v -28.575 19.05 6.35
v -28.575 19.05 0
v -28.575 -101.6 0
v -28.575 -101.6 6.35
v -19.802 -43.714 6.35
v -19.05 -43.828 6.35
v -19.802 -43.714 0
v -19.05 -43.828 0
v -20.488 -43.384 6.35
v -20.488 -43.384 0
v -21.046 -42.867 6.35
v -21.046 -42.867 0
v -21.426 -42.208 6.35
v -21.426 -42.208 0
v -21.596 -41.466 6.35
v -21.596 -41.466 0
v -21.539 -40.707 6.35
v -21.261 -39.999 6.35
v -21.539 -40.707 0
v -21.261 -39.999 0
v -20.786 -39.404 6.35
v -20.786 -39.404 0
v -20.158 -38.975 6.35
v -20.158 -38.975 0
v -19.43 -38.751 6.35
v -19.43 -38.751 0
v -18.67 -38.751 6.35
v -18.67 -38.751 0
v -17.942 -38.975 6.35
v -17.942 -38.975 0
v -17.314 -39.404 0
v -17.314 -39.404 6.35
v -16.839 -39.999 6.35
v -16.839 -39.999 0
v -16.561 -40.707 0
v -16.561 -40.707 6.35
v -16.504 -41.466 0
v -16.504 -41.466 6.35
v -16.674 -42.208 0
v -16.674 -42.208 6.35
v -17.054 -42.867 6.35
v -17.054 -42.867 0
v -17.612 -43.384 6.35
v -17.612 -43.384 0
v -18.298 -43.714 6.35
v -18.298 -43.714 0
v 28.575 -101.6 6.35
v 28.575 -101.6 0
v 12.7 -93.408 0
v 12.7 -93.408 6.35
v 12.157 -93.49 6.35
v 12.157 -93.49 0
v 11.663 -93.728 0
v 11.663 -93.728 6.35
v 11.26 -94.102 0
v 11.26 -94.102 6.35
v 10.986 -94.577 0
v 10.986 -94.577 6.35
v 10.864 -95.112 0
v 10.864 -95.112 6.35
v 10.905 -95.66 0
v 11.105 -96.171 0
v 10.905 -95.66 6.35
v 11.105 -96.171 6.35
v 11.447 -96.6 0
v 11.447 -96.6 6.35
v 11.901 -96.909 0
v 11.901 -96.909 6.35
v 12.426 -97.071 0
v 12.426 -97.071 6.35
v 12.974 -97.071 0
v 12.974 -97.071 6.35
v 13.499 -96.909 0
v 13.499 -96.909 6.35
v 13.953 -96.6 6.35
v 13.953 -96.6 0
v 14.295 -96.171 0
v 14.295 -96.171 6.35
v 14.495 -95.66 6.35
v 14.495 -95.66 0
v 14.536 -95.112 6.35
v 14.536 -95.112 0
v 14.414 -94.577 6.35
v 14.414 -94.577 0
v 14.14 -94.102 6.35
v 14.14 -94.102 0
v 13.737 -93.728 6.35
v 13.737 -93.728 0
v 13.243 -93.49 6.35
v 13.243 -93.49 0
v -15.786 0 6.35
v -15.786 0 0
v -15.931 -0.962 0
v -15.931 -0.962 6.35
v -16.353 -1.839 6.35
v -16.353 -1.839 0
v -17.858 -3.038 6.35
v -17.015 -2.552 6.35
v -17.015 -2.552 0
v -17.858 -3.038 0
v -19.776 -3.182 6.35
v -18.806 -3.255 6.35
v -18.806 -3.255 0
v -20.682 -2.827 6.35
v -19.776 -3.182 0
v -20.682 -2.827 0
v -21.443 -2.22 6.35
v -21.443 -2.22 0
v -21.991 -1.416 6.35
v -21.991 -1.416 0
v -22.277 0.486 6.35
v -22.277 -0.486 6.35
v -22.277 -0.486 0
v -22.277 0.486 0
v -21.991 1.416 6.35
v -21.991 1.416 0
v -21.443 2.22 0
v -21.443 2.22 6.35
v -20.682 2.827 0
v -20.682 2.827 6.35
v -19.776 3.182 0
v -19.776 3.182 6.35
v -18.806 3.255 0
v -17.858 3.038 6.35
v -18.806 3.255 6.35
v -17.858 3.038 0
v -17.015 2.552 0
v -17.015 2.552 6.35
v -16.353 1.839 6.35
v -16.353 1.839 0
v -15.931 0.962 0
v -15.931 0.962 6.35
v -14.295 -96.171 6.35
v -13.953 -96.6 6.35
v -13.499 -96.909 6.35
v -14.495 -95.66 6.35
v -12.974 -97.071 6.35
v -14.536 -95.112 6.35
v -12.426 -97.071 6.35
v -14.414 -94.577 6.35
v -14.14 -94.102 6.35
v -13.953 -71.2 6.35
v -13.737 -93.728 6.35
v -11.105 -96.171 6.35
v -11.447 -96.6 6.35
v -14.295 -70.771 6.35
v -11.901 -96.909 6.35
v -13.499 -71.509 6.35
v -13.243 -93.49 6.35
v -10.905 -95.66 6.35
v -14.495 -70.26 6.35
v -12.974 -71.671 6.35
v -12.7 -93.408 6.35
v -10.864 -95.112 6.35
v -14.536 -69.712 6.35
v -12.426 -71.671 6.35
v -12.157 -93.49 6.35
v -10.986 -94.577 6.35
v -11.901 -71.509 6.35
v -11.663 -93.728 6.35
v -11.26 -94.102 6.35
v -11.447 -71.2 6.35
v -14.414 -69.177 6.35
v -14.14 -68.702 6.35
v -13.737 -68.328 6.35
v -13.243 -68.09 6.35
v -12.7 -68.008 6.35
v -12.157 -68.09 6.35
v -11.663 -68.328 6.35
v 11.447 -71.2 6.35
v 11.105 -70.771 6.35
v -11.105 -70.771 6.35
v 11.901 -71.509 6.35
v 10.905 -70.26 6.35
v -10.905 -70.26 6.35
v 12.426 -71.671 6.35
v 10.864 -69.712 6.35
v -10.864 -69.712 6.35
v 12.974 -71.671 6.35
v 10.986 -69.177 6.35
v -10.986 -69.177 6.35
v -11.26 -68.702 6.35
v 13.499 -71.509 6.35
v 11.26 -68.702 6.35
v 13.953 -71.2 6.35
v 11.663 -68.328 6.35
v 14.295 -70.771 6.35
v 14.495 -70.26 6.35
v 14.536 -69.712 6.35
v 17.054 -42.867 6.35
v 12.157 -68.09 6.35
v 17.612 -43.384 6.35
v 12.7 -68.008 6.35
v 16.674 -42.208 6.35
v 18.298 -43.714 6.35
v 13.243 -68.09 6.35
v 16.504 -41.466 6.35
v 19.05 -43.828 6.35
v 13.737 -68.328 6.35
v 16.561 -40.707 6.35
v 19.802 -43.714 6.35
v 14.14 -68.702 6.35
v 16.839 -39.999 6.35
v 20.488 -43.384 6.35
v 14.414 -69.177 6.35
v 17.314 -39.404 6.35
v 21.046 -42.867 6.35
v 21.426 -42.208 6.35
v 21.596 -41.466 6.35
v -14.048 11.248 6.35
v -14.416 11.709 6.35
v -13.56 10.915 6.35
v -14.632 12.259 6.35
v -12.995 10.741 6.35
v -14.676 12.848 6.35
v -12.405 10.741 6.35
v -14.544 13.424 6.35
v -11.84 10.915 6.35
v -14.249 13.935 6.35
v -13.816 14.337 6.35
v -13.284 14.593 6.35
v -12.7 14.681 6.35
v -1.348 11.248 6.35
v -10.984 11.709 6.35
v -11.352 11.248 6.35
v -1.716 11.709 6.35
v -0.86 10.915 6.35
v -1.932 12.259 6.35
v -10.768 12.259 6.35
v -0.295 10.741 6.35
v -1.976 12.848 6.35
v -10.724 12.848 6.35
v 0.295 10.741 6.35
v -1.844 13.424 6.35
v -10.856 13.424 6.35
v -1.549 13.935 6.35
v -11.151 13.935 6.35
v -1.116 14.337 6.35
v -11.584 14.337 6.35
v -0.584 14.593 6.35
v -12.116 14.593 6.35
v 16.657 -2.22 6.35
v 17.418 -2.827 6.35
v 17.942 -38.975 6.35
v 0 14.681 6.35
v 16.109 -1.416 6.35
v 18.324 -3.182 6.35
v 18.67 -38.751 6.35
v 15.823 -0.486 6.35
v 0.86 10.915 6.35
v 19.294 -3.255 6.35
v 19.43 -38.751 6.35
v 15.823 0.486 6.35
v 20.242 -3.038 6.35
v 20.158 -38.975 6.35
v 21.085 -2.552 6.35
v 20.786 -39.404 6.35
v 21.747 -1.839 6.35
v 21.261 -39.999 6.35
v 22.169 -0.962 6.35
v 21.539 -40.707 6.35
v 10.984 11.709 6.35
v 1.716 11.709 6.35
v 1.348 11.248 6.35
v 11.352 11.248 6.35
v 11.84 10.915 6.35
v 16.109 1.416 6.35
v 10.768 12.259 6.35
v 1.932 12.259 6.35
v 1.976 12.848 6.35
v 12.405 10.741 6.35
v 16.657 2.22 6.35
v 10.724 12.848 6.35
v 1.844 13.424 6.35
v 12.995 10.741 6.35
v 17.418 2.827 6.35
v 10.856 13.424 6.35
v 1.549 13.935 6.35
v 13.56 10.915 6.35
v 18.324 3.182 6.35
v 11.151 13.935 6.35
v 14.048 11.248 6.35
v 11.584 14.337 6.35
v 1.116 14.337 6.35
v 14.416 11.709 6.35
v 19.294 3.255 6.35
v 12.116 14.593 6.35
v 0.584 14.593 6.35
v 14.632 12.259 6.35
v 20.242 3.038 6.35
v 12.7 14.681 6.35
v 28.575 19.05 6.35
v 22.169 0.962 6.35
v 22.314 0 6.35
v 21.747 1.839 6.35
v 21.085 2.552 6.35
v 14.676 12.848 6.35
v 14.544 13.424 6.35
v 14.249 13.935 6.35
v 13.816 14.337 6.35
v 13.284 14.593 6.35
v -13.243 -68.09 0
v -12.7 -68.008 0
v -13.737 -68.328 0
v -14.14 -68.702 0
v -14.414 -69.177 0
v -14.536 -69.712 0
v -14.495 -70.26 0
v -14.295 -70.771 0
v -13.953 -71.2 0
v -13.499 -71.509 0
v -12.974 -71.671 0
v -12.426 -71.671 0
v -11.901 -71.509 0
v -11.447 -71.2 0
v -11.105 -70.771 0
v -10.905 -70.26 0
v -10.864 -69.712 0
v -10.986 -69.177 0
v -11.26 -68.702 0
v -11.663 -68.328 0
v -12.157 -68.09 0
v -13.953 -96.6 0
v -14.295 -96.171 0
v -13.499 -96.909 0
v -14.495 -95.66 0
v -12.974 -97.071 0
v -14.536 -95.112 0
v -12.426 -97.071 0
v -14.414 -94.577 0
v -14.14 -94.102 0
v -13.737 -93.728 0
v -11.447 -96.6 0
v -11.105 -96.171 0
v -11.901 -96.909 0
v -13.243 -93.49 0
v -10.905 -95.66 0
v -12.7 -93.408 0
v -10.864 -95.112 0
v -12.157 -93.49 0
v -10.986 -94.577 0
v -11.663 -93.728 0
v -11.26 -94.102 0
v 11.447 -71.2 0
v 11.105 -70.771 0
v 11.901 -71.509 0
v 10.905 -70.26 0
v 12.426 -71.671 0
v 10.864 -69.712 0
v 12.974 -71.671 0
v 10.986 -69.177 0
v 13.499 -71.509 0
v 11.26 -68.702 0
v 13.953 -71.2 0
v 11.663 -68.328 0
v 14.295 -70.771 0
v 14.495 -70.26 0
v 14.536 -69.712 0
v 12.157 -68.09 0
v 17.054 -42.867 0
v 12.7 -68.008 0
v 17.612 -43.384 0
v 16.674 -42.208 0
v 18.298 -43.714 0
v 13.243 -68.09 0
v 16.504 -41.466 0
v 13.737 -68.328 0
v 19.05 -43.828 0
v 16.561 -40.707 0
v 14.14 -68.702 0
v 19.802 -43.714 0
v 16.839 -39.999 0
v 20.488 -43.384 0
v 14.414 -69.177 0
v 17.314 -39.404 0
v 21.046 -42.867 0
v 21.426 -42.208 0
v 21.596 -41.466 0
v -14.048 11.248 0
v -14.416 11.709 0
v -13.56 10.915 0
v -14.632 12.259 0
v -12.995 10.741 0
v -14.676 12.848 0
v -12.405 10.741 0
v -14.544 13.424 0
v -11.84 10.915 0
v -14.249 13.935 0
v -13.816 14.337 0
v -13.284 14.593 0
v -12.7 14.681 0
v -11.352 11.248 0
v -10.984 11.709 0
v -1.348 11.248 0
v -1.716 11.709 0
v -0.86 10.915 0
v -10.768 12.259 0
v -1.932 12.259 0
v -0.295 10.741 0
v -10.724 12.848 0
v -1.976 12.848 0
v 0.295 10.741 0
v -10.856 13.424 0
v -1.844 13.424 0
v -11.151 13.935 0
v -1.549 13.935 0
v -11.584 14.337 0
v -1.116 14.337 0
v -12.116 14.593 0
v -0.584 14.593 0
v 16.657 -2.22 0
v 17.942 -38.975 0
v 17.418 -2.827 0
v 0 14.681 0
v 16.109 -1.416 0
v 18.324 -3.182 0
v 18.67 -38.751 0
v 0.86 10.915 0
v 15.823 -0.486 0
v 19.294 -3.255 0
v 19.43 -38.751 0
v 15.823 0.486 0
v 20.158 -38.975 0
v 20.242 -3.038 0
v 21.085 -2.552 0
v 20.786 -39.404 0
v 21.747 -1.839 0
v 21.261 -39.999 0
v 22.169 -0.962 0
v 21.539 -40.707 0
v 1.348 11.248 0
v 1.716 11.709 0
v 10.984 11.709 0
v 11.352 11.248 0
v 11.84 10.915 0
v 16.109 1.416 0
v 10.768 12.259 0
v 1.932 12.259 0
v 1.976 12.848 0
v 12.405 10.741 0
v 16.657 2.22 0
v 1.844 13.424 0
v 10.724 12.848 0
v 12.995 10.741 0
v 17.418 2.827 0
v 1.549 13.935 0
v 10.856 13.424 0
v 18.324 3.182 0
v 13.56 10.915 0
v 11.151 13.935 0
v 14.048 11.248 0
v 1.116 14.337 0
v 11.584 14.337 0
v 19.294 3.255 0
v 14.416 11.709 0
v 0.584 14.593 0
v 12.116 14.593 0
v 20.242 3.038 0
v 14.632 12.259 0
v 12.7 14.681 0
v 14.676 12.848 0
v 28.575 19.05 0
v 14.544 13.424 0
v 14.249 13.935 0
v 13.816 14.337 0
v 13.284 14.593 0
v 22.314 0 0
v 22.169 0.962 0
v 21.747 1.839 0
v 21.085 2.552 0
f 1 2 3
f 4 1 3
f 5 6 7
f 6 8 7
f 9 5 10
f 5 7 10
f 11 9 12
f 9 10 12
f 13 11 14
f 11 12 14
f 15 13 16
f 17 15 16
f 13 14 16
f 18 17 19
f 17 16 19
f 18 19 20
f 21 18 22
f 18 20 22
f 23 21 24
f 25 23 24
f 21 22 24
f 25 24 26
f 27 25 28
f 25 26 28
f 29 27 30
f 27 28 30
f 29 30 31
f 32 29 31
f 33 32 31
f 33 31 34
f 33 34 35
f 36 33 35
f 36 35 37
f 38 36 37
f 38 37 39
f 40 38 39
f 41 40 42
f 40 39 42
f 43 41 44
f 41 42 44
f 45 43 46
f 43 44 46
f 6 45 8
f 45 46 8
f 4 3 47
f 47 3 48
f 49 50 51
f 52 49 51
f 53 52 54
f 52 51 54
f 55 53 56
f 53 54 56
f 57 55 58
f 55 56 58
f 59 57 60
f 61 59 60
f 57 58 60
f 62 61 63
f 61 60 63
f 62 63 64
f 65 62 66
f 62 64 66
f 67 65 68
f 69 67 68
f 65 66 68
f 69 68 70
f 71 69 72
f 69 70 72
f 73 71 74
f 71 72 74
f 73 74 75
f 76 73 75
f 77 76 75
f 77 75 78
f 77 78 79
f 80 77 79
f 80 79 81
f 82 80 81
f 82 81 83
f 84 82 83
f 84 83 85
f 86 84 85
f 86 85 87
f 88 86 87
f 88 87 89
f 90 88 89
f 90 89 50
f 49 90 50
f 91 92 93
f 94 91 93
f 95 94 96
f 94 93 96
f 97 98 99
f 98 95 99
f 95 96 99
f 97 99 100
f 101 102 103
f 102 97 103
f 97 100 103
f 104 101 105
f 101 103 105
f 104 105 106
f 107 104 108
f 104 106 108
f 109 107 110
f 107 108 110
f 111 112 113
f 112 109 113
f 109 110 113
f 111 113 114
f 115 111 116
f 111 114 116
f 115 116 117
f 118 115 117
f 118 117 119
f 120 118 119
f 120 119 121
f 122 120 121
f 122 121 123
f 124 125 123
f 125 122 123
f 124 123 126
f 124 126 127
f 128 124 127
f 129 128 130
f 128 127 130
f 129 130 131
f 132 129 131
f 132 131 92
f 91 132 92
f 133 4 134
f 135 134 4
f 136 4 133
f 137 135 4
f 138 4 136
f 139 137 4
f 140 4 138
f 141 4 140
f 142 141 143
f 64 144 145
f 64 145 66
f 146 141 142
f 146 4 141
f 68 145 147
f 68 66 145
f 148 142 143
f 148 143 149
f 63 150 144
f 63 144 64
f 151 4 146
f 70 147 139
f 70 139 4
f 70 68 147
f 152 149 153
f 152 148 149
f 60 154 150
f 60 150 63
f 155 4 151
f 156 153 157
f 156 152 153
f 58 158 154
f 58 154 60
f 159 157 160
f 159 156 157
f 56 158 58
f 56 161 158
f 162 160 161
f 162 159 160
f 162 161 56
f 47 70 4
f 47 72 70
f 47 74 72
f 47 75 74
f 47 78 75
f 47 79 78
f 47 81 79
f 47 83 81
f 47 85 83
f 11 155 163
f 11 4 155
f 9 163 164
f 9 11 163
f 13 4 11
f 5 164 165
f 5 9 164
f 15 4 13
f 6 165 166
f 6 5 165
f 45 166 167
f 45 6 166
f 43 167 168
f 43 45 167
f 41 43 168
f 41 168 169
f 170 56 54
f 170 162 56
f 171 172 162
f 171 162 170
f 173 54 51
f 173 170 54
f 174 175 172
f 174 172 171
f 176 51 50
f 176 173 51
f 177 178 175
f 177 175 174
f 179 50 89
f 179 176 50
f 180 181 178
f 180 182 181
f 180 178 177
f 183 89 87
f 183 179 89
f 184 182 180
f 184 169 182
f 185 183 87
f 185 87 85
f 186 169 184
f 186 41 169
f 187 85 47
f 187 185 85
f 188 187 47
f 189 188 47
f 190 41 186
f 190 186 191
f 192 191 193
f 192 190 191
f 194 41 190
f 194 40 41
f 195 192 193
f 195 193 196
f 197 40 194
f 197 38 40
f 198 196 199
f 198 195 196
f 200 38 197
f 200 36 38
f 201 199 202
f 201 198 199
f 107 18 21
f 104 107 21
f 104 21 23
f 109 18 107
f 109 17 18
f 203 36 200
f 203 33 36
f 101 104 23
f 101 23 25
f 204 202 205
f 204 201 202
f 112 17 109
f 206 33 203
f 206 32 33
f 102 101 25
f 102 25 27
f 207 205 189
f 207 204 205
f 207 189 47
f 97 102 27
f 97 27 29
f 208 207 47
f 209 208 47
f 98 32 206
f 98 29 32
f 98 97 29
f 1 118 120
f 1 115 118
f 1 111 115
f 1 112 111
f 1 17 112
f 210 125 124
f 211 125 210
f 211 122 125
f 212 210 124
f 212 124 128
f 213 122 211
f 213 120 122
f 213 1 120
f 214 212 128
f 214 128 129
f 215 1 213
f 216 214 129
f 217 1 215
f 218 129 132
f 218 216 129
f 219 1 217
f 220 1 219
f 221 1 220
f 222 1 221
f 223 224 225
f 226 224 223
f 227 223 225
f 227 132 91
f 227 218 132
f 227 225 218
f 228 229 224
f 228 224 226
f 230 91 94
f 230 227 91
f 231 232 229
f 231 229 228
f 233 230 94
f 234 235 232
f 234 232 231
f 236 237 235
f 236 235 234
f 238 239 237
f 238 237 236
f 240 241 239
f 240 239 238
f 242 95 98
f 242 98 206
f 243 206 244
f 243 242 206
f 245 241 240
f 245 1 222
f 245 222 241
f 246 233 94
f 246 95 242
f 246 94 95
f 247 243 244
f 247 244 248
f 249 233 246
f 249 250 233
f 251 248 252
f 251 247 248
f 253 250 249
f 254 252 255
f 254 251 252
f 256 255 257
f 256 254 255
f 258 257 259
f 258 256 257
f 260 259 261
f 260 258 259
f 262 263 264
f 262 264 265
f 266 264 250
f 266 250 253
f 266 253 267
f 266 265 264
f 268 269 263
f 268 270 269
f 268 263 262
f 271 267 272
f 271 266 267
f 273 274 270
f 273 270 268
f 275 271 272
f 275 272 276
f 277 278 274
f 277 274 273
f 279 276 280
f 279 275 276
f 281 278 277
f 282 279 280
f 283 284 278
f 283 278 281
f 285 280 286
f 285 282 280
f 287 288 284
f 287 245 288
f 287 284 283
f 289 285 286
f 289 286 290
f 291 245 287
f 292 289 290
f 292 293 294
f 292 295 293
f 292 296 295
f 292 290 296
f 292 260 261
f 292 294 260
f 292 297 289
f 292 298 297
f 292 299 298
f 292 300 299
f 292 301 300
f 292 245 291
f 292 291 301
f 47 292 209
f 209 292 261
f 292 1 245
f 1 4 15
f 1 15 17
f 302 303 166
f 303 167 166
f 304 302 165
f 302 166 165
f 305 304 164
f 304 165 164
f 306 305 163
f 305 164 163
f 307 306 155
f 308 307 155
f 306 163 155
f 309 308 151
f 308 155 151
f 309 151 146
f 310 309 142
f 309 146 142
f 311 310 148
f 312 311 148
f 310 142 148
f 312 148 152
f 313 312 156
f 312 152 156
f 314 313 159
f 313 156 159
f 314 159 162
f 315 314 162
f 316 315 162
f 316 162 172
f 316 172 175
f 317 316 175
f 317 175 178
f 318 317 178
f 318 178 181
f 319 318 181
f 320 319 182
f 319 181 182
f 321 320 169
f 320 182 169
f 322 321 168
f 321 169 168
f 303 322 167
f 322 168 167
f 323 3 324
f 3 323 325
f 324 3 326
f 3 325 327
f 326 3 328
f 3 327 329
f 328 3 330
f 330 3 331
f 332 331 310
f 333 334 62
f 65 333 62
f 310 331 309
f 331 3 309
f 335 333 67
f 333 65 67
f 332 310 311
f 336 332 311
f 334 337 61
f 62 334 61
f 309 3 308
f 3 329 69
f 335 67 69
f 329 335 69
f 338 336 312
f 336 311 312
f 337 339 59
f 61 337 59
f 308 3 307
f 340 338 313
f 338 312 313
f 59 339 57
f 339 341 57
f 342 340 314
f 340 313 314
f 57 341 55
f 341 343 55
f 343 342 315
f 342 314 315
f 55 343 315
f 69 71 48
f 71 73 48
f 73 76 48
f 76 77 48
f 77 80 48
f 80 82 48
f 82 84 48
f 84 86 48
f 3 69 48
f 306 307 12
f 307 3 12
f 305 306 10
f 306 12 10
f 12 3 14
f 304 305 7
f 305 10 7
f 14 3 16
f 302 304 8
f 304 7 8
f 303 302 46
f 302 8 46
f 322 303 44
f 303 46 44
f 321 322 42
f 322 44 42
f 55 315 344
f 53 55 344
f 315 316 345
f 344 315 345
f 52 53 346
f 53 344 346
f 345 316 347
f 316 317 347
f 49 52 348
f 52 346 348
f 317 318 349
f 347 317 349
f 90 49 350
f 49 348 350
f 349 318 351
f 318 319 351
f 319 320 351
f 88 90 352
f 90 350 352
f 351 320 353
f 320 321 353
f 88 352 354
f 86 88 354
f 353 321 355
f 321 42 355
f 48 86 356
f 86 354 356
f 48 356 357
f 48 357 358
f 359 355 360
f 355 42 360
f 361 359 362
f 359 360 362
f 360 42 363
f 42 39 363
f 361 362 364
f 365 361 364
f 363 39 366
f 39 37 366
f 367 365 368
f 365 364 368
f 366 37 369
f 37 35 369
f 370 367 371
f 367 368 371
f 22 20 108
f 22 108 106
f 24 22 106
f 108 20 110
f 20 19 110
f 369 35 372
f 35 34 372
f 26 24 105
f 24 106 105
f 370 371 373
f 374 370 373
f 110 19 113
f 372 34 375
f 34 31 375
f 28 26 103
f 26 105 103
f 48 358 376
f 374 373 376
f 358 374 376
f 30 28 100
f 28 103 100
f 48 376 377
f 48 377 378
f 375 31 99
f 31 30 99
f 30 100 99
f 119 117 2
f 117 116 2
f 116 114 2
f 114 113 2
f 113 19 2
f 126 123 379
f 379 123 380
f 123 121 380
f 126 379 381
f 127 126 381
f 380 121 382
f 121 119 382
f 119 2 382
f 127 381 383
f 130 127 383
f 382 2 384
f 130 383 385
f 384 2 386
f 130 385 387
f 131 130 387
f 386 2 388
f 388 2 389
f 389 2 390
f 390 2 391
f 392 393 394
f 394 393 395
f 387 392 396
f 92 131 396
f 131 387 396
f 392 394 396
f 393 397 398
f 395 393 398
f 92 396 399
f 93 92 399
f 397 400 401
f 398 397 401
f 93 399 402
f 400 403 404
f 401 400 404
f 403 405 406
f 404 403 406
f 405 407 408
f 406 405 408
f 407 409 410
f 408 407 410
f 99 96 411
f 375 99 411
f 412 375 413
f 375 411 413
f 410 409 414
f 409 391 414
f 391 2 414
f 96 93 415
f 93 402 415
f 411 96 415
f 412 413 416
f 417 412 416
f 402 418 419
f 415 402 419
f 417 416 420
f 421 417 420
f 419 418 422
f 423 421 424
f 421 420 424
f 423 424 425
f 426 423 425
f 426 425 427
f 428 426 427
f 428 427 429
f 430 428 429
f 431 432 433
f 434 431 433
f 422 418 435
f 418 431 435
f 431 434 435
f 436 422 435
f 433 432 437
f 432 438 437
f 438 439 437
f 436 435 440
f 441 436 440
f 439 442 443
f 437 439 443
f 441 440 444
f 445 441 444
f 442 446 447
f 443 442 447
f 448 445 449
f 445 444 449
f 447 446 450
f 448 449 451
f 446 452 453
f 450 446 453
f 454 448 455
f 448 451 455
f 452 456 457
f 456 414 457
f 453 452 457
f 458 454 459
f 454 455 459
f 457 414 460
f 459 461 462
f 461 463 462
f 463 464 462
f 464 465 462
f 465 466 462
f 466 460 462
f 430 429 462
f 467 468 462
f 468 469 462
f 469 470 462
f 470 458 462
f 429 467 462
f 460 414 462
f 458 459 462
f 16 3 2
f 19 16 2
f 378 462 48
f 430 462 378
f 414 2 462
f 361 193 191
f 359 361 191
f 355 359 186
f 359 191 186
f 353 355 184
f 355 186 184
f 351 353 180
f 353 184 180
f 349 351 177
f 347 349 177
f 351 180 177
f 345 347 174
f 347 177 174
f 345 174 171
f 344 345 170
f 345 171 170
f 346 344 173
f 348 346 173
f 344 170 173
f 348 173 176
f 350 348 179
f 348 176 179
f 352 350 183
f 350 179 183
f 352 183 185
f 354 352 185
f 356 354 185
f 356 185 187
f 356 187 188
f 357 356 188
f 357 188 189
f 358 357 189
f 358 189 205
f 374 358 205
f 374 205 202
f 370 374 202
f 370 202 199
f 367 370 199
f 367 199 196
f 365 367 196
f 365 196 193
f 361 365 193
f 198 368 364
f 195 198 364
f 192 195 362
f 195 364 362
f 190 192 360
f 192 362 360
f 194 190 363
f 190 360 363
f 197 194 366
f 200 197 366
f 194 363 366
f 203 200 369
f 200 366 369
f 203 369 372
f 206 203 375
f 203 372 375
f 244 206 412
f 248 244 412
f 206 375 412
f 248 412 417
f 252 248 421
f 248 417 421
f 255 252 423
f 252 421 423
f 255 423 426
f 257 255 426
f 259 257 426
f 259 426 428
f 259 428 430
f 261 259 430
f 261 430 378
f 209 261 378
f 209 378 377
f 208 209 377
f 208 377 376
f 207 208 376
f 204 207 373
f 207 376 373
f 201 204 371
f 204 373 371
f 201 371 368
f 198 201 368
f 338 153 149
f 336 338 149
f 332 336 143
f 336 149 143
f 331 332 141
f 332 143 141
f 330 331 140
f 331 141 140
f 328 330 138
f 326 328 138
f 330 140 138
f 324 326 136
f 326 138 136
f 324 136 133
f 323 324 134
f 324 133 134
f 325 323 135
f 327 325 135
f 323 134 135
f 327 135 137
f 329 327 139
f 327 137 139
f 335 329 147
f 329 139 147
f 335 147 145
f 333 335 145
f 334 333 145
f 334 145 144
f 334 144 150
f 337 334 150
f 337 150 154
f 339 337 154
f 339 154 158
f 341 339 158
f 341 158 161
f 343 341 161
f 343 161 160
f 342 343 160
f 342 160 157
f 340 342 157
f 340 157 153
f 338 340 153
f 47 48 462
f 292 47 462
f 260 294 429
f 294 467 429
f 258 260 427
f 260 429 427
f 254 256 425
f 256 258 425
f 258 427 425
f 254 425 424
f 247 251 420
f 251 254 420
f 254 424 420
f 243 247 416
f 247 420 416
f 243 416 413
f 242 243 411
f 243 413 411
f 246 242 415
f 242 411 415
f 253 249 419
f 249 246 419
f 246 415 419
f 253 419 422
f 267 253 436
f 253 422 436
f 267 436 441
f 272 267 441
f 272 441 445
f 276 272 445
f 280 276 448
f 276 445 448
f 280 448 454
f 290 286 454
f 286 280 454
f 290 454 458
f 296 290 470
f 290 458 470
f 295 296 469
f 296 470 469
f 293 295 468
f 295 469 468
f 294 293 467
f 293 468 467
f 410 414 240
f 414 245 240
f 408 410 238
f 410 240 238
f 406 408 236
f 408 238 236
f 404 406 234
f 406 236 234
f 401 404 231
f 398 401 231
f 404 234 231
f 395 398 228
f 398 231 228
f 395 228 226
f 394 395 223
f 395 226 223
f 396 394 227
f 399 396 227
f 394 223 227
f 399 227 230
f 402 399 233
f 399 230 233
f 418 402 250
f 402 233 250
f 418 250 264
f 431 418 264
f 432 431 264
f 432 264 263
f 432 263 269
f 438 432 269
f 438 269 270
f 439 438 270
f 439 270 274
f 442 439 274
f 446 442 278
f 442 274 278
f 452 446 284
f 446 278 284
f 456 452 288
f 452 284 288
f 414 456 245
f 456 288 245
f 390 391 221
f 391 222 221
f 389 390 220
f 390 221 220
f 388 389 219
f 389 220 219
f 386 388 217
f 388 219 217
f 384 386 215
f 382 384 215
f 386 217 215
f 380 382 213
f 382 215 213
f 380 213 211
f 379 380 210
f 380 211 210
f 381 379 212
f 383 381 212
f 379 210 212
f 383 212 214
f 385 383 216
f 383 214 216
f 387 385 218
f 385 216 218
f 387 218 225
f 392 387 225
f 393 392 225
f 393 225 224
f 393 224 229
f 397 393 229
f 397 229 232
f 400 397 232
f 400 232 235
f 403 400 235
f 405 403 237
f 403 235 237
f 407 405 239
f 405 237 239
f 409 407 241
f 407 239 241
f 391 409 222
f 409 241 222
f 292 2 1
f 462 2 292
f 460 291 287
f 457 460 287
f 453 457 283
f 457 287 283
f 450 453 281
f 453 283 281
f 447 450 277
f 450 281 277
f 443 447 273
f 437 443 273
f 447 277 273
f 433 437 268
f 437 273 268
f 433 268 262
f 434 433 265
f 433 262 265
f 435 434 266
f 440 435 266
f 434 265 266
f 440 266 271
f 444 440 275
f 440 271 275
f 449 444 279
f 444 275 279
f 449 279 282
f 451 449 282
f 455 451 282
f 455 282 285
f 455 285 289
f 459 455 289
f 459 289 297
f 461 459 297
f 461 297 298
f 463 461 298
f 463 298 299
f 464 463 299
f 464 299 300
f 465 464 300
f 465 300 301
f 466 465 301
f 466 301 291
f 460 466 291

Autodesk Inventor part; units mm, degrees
ref_plane "YZ Plane" through (0, 0, 0) normal (1, 0, 0) x (0, 1, 0)
ref_plane "XZ Plane" through (0, 0, 0) normal (0, 1, 0) x (-1, 0, 0)
ref_plane "XY Plane" through (0, 0, 0) normal (0, 0, 1) x (1, 0, 0)
sketch "Sketch1" plane through (0, 0, 0) normal (0, 0, 1) x (1, 0, 0)
  line L0 (-19.05, 0) -> (19.05, 0) construction
  circle A0 centre (-19.05, 0) radius 3.2639
  circle A1 centre (19.05, 0) radius 3.2639
  line L1 (-28.575, 19.5947) -> (-28.575, -101.6)
  line L2 (-28.575, -101.6) -> (28.575, -101.6)
  line L3 (28.575, -101.6) -> (28.575, 19.5947)
  line L4 (-26.7151, 24.0849) -> (-4.4901, 46.3099)
  line L5 (4.4901, 46.3099) -> (26.7151, 24.0849)
  arc A2 (4.4901, 46.3099) -> (-4.4901, 46.3099) centre (0, 41.8197) ccw
  arc A3 (-26.7151, 24.0849) -> (-28.575, 19.5947) centre (-22.225, 19.5947) ccw
  arc A4 (28.575, 19.5947) -> (26.7151, 24.0849) centre (22.225, 19.5947) ccw
  line L6 (-28.575, 19.05) -> (28.575, 19.05)
  line L7 (-12.7, 12.7) -> (12.7, 12.7) construction
  line L8 (-12.7, -69.85) -> (12.7, -69.85) construction
  point P0 (0, 0)
  point P1 (0, 0)
  point P2 (0, 50.8)
  point P3 (28.575, 22.225)
  point P4 (-28.575, 22.225)
  point P5 (0, -101.6)
  point P6 (0, 12.7)
  point P7 (0, 12.7)
  point P8 (-12.7, -95.25)
  point P9 (12.7, -95.25)
  point P10 (0, -69.85)
  dimension "d0" = 6.5278
  dimension "d1" = 38.1
  dimension "d4" = 101.6
  dimension "d17" = 152.4
  dimension "d18" = 57.15
  dimension "d19" = 6.35
  dimension "d20" = 120.65
  dimension "d21" = 25.4
  dimension "d29" = 6.35
  dimension "d32" = 25.4
  dimension "d33" = 25.4
  dimension "d34" = 6.35
extrude "Extrusion1" add sketch "Sketch1" along normal blind 6.35 contours L6 L3 L2 L1
sketch "Sketch2" plane through (0, 0, 6.35) normal (0, 0, 1) x (1, 0, 0)
  line L0 (-19.05, -41.275) -> (19.05, -41.275) construction
  line L1 (-28.575, -101.6) -> (28.575, -101.6) projected
  point P0 (0, 0)
  point P1 (0, -41.275)
  dimension "d8" = 38.1
  dimension "d9" = 60.325
hole "Hole1" at (-19.05, -41.275, 6.35) at (19.05, -41.275, 6.35) direction (0, 0, -1) diameter 5.1054 end through all clearance for "Flat Head Machine Screw (82)" size "#10" standard "Ansi Unified Screw Threads"
hole "Hole2" at (-12.7, 12.7, 0) at (0, 12.7, 0) at (12.7, 12.7, 0) direction (0, 0, 1) diameter 3.9624 end through all thread size "10-32 UNF" class "2B" standard "ANSI Unified Screw Threads"
hole "Hole3" at (-12.7, -69.85, 0) at (12.7, -69.85, 0) at (-12.7, -95.25, 0) at (12.7, -95.25, 0) direction (0, 0, 1) diameter 3.683 end through all thread size "10-24 UNC" class "2B" standard "ANSI Unified Screw Threads"
properties part number "CL7-005aa" material "Aluminum 6061"
